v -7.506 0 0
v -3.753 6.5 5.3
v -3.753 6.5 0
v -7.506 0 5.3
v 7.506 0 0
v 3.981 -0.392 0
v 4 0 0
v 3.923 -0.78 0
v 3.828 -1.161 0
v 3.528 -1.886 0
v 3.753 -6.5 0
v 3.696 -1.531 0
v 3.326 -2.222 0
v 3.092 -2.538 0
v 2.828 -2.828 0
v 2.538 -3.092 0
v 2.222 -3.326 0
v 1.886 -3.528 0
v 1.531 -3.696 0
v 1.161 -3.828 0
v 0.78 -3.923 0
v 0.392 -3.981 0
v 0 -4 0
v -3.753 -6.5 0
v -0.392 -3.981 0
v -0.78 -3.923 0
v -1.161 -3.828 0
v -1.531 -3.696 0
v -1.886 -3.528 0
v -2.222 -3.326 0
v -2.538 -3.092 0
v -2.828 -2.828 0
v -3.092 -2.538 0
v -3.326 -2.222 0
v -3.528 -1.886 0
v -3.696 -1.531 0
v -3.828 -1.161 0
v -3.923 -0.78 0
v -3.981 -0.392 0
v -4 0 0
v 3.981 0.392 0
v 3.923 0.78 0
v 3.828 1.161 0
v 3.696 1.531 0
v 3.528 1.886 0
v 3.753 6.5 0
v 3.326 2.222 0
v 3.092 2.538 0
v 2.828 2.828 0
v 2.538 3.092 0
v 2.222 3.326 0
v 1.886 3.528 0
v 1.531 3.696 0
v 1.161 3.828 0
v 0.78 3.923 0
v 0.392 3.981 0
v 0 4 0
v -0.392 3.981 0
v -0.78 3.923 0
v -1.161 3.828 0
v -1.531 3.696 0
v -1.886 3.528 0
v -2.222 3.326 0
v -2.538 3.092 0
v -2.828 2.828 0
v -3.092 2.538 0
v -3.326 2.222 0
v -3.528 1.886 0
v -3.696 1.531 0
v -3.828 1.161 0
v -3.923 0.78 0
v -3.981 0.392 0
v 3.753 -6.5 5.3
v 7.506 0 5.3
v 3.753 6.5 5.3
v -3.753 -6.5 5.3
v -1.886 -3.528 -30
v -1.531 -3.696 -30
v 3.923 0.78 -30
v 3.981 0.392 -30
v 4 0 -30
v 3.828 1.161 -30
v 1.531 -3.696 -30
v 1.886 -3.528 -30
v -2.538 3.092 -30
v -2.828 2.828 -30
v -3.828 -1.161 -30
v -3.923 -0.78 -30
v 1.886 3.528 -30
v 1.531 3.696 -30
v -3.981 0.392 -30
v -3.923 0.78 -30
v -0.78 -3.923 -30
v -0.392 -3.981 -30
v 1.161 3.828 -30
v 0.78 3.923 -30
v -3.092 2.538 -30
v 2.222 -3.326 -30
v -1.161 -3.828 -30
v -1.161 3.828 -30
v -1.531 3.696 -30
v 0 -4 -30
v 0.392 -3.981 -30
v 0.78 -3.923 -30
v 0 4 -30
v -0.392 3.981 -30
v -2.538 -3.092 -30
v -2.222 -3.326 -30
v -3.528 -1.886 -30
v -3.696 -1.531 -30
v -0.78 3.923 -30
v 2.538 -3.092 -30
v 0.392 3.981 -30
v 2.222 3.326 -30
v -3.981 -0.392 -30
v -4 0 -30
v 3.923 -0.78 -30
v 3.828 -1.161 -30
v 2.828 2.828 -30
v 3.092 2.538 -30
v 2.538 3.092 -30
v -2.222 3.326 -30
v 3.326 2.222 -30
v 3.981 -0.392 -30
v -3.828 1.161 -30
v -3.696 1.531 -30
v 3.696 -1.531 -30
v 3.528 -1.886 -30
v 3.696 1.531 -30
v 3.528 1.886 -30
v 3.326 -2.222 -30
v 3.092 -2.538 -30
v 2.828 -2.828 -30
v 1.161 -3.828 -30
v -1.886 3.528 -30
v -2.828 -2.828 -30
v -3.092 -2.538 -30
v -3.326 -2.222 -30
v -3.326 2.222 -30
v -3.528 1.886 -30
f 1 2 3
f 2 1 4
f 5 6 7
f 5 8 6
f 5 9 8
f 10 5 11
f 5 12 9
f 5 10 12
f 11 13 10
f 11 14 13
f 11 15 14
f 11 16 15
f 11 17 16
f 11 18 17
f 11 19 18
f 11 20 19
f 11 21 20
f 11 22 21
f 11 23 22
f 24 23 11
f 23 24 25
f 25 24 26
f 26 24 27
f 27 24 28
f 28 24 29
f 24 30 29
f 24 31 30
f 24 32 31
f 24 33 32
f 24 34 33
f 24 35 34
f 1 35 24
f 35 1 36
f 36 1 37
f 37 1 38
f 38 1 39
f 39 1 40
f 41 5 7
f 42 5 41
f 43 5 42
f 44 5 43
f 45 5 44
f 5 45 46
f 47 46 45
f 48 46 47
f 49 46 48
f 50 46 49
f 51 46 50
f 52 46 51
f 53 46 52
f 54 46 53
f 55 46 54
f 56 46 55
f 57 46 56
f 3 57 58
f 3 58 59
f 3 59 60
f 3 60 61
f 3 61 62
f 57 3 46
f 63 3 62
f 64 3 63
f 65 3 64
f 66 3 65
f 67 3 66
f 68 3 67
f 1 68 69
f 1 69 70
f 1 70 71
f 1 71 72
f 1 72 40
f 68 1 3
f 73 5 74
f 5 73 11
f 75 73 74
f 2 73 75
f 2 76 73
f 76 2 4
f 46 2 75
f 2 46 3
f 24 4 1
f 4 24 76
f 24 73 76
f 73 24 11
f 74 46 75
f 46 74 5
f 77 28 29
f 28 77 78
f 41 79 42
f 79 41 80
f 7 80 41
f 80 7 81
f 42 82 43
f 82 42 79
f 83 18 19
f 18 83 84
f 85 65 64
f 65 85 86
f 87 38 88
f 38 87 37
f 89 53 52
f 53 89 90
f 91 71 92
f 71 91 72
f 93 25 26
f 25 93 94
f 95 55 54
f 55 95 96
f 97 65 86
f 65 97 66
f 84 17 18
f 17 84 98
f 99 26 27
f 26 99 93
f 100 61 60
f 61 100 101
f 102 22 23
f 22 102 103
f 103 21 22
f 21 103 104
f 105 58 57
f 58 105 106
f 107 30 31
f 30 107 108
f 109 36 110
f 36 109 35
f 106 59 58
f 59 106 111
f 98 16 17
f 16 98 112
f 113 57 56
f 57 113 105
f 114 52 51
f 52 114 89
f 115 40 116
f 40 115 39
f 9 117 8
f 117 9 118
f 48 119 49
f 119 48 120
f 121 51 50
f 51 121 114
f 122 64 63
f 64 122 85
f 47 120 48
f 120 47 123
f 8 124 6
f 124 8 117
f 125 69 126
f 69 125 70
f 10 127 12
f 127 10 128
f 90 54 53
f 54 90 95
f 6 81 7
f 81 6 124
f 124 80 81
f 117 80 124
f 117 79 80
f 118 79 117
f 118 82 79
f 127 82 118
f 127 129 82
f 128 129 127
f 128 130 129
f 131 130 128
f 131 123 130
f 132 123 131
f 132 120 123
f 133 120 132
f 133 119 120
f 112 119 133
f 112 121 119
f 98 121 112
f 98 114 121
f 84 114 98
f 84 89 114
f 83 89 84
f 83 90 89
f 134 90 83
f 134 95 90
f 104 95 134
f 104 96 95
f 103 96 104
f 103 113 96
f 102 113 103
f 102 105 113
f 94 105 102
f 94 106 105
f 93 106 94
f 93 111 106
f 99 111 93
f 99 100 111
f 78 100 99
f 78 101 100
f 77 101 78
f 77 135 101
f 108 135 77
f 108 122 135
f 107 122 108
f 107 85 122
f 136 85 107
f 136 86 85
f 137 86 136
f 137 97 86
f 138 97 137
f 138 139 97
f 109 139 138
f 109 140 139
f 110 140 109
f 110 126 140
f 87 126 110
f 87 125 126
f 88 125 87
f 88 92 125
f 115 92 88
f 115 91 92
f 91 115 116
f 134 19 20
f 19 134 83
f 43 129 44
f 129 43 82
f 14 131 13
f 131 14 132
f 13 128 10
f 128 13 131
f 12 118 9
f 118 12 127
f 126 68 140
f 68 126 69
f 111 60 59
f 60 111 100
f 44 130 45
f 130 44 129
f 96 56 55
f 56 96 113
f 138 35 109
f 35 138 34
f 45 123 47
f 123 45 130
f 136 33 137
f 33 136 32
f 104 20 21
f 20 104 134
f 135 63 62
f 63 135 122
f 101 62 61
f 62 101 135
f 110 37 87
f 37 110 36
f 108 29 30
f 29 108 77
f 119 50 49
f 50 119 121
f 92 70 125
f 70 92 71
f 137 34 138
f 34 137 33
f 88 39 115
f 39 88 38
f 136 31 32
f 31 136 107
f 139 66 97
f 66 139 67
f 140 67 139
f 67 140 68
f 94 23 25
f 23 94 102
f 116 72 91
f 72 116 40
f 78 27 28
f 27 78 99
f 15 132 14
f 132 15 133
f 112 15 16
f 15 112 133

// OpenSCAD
// M8 Hex Bolt (simplified - no thread)
// Head bottom face at z=0, shank extends in -Z direction

// Parameters
across_flats = 13;    // Head across-flats distance (mm)
head_height  = 5.3;   // Head height (mm)
shank_dia    = 8;     // Shank diameter (mm)
shank_len    = 30;    // Shank length (mm)

// Circumradius of regular hexagon from across-flats distance
hex_r = across_flats / (2 * cos(30));  // = across_flats / sqrt(3)

// Hex head: bottom at z=0, extends in +Z direction
module hex_head() {
    linear_extrude(height = head_height) {
        circle(r = hex_r, $fn = 6);
    }
}

// Shank: top at z=0, extends in -Z direction
module shank() {
    translate([0, 0, -shank_len]) {
        cylinder(h = shank_len, d = shank_dia, $fn = 64);
    }
}

// Assemble bolt
union() {
    hex_head();
    shank();
}
